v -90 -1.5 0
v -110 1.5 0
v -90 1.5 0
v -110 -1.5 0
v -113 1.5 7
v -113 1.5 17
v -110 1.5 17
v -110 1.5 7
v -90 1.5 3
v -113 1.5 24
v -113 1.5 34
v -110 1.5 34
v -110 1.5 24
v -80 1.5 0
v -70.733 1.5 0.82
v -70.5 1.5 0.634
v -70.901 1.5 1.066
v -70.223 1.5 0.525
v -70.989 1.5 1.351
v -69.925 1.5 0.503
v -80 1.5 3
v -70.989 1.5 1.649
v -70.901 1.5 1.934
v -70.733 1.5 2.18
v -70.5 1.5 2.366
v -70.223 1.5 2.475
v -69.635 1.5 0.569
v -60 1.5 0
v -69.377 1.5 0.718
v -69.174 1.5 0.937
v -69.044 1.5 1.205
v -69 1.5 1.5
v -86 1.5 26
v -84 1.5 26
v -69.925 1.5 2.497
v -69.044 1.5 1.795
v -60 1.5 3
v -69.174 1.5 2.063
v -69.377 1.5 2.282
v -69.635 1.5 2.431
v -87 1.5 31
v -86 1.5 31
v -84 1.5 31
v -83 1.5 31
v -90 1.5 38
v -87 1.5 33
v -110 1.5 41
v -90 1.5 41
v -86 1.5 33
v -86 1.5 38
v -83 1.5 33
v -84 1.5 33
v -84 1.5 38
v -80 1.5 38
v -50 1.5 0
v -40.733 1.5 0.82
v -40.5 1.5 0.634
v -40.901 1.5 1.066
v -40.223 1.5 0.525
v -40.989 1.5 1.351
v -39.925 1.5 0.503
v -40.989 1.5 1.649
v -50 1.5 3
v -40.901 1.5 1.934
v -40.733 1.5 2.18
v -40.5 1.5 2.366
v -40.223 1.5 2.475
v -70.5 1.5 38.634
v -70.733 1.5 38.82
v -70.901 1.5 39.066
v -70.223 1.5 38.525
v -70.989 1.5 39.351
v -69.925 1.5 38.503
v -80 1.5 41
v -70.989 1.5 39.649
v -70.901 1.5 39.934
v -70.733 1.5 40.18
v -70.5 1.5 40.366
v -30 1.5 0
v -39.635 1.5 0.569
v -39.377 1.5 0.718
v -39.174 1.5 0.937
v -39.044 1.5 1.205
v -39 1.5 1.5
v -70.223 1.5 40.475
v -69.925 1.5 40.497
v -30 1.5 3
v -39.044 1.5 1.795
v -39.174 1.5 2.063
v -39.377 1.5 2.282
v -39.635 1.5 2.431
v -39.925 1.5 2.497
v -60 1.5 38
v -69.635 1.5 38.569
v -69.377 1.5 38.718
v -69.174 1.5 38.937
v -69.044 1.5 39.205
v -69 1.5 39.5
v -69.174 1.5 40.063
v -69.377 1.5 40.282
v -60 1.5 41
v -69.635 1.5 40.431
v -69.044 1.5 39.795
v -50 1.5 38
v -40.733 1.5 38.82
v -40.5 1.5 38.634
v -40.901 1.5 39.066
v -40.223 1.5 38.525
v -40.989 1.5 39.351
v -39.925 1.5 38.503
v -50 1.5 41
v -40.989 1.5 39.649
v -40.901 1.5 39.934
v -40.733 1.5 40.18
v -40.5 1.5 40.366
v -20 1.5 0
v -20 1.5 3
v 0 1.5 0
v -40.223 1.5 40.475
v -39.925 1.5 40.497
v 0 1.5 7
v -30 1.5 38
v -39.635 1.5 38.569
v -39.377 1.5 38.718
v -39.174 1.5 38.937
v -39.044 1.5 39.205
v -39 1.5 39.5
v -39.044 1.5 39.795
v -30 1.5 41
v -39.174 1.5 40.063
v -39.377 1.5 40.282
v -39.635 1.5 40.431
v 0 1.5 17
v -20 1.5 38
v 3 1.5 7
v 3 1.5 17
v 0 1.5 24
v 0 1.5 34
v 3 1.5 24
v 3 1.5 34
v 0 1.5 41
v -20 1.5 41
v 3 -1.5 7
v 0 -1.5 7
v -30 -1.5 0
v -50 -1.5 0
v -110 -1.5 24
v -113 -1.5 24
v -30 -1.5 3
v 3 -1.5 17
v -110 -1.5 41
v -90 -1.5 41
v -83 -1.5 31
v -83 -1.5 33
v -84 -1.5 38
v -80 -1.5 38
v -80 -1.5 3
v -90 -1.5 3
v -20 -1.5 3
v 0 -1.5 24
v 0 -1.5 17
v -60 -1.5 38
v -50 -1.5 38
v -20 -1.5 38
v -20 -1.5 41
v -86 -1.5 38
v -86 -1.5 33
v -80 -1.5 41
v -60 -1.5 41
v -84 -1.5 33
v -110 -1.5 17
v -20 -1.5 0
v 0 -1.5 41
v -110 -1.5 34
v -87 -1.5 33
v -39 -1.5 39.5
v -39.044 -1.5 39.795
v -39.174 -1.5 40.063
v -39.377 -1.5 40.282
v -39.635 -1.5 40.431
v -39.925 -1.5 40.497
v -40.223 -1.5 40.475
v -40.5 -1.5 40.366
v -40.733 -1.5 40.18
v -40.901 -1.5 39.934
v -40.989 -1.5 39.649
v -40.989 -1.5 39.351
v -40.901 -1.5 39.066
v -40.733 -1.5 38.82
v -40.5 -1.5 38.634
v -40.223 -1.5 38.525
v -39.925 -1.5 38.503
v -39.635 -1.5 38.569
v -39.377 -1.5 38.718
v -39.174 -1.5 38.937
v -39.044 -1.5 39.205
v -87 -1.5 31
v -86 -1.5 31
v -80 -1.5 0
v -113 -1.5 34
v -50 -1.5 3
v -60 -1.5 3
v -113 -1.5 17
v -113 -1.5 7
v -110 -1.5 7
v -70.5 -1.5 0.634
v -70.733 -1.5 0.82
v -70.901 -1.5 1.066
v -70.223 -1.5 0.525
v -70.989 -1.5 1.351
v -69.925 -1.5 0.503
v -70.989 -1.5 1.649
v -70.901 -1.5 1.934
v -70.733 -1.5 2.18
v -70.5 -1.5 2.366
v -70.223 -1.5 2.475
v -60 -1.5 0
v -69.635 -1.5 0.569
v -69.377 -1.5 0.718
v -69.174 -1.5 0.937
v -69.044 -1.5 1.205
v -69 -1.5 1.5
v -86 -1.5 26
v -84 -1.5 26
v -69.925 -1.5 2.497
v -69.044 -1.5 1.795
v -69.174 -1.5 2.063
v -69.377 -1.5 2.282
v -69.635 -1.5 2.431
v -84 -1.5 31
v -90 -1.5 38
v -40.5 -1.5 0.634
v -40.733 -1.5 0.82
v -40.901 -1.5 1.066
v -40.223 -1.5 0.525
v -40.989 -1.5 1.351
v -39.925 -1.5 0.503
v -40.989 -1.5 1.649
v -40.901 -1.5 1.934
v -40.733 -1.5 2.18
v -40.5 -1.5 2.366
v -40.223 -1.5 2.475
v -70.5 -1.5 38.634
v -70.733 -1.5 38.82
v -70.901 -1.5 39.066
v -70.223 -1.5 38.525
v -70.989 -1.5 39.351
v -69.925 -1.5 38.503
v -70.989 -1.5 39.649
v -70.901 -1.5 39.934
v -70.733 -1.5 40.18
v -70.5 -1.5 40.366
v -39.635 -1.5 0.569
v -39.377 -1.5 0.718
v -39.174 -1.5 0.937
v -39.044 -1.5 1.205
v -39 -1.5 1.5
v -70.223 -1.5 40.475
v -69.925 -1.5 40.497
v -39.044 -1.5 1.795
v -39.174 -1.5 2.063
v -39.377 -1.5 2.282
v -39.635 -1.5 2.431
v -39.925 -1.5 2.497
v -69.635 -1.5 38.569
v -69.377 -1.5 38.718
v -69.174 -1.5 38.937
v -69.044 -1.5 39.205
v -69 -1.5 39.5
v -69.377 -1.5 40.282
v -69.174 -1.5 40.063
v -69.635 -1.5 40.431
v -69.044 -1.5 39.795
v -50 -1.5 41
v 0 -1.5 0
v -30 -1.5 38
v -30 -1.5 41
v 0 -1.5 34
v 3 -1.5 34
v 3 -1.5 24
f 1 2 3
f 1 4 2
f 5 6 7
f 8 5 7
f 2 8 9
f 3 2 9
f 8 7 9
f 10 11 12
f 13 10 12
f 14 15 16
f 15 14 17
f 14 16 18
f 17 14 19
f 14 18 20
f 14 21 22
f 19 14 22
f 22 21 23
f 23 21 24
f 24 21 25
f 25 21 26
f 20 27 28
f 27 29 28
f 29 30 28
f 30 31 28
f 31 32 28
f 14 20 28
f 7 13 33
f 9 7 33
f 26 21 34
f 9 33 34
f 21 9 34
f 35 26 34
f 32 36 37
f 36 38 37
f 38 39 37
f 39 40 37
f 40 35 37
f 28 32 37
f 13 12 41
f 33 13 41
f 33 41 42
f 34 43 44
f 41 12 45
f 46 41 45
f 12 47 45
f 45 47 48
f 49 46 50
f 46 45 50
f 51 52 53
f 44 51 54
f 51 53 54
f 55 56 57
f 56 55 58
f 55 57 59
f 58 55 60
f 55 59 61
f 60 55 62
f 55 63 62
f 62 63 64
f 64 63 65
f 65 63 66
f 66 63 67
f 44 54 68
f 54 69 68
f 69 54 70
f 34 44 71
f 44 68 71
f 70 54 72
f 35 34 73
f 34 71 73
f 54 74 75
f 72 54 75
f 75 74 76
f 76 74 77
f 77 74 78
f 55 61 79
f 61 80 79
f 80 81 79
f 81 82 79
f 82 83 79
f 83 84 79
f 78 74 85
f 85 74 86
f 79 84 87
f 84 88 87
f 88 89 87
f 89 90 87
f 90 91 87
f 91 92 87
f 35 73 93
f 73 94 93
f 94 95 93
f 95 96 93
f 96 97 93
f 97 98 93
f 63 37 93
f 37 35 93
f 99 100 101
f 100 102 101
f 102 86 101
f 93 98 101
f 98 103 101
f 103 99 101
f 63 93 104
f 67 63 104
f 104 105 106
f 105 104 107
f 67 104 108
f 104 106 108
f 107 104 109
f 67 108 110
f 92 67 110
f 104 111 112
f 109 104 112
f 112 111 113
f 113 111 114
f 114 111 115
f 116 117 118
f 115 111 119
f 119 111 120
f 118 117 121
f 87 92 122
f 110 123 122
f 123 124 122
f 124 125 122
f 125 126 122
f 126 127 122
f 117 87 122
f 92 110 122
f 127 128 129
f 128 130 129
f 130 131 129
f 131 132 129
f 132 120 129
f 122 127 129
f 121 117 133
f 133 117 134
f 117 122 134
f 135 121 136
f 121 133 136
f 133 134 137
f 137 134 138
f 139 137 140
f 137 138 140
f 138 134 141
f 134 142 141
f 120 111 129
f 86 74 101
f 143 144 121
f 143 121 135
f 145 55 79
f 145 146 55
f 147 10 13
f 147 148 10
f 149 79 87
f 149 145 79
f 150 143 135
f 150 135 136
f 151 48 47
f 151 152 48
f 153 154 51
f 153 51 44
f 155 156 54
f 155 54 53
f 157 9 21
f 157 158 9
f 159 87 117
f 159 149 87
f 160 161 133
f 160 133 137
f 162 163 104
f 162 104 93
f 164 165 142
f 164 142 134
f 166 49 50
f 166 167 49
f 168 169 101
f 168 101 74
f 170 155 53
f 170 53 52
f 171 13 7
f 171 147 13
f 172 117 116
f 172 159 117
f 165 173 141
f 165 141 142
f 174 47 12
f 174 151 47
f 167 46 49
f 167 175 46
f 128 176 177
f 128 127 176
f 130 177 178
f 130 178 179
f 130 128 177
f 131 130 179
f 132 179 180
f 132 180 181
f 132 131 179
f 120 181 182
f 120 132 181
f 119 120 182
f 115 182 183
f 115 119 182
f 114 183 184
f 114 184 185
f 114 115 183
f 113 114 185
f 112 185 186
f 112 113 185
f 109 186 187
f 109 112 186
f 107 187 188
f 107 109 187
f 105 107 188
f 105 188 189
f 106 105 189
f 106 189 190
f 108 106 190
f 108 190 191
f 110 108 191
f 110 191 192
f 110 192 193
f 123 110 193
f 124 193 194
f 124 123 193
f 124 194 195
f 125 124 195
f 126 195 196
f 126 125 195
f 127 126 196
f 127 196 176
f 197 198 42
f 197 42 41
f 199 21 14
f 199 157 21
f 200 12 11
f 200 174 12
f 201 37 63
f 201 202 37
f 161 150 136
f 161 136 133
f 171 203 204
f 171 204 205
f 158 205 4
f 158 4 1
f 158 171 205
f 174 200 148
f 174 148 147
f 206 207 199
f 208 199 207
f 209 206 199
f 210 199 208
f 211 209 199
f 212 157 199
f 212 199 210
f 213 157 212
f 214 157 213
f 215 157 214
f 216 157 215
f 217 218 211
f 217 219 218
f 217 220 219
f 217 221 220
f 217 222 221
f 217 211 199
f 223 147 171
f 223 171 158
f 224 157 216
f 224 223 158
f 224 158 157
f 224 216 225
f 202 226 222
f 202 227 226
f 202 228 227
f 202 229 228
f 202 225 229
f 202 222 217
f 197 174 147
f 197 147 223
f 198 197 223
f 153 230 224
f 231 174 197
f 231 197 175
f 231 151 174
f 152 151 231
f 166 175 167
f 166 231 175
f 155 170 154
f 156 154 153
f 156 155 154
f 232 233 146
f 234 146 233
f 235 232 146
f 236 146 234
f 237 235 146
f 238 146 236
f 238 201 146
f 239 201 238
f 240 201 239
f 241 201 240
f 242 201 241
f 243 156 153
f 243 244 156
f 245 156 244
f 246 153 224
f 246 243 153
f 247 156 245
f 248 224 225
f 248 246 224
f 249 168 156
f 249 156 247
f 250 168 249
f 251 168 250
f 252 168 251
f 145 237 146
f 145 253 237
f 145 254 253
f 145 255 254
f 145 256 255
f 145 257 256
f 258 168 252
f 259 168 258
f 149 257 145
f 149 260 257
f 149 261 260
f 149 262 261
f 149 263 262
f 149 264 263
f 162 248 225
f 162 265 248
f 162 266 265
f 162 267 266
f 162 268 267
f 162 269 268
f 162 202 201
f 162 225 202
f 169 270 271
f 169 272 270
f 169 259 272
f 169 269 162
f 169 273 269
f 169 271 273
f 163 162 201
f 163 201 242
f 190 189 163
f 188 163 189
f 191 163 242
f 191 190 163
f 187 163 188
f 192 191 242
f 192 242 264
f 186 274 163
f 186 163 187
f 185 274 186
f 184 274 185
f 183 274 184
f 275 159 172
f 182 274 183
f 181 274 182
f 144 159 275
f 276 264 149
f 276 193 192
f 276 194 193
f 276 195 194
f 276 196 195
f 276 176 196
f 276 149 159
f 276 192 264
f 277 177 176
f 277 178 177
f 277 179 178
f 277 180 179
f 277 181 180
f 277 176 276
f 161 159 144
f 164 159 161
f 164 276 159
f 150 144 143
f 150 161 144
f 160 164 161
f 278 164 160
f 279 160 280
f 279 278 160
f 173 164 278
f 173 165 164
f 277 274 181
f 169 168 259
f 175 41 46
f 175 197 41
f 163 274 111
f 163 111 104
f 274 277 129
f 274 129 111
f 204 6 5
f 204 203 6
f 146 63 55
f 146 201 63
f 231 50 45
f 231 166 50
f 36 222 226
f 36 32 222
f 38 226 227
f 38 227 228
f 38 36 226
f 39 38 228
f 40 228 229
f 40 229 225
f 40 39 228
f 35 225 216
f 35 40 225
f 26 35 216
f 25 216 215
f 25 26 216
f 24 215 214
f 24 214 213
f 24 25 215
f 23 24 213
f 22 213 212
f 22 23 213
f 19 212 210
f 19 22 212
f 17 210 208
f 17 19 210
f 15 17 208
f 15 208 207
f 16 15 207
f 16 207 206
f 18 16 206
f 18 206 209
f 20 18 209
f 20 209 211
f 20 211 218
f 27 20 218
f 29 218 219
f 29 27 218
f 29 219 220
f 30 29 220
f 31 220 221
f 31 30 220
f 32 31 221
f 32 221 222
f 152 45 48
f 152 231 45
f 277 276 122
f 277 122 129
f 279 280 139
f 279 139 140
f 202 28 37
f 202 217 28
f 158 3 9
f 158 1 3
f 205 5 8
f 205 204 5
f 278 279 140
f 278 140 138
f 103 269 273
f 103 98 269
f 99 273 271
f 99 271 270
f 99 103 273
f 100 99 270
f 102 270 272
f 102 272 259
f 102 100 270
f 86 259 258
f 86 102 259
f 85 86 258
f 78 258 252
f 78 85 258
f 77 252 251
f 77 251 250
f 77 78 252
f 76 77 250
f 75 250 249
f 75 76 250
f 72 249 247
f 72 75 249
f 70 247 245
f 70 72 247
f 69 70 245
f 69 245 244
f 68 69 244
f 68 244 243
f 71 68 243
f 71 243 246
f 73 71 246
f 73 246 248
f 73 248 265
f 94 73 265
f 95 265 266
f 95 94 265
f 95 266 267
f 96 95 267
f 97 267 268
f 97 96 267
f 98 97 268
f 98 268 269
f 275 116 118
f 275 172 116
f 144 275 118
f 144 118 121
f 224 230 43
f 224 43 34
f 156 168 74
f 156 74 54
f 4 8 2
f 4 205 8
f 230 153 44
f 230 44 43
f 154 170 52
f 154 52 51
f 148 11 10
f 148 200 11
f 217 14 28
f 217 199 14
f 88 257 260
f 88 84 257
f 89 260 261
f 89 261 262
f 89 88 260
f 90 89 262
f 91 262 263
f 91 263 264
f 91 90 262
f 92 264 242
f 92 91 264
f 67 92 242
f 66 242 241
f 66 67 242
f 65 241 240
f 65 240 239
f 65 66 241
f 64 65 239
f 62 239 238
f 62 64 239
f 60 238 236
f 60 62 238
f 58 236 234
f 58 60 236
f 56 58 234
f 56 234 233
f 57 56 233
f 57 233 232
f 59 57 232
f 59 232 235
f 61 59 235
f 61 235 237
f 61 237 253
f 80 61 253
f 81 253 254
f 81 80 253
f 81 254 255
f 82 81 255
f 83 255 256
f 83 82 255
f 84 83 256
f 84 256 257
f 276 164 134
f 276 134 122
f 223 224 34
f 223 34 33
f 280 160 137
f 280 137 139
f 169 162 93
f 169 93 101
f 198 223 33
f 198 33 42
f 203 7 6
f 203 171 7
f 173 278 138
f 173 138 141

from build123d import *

# Parameters (mm, degrees)
F0_R     = 1
F1_DEPTH = 1.5


with BuildPart() as f1:
    # F0 (on Front) → F1 (new body, symmetric)
    with BuildSketch(Plane.XZ):
        Polygon((-20, 0), (0, 0), (0, 7), (3, 7), (3, 17), (0, 17), (0, 24), (3, 24), (3, 34), (0, 34), (0, 41), (-20, 41), (-20, 38), (-30, 38), (-30, 41), (-50, 41), (-50, 38), (-60, 38), (-60, 41), (-80, 41), (-80, 38), (-84, 38), (-84, 33), (-83, 33), (-83, 31), (-84, 31), (-84, 26), (-86, 26), (-86, 31), (-87, 31), (-87, 33), (-86, 33), (-86, 38), (-90, 38), (-90, 41), (-110, 41), (-110, 34), (-113, 34), (-113, 24), (-110, 24), (-110, 17), (-113, 17), (-113, 7), (-110, 7), (-110, 0), (-90, 0), (-90, 3), (-80, 3), (-80, 0), (-60, 0), (-60, 3), (-50, 3), (-50, 0), (-30, 0), (-30, 3), (-20, 3), align=None)
        with Locations((-70, 1.5)):
            Circle(F0_R, mode=Mode.SUBTRACT)
        with Locations((-40, 1.5)):
            Circle(F0_R, mode=Mode.SUBTRACT)
        with Locations((-70, 39.5)):
            Circle(F0_R, mode=Mode.SUBTRACT)
        with Locations((-40, 39.5)):
            Circle(F0_R, mode=Mode.SUBTRACT)
    extrude(amount=F1_DEPTH, both=True)


solid = f1.part
